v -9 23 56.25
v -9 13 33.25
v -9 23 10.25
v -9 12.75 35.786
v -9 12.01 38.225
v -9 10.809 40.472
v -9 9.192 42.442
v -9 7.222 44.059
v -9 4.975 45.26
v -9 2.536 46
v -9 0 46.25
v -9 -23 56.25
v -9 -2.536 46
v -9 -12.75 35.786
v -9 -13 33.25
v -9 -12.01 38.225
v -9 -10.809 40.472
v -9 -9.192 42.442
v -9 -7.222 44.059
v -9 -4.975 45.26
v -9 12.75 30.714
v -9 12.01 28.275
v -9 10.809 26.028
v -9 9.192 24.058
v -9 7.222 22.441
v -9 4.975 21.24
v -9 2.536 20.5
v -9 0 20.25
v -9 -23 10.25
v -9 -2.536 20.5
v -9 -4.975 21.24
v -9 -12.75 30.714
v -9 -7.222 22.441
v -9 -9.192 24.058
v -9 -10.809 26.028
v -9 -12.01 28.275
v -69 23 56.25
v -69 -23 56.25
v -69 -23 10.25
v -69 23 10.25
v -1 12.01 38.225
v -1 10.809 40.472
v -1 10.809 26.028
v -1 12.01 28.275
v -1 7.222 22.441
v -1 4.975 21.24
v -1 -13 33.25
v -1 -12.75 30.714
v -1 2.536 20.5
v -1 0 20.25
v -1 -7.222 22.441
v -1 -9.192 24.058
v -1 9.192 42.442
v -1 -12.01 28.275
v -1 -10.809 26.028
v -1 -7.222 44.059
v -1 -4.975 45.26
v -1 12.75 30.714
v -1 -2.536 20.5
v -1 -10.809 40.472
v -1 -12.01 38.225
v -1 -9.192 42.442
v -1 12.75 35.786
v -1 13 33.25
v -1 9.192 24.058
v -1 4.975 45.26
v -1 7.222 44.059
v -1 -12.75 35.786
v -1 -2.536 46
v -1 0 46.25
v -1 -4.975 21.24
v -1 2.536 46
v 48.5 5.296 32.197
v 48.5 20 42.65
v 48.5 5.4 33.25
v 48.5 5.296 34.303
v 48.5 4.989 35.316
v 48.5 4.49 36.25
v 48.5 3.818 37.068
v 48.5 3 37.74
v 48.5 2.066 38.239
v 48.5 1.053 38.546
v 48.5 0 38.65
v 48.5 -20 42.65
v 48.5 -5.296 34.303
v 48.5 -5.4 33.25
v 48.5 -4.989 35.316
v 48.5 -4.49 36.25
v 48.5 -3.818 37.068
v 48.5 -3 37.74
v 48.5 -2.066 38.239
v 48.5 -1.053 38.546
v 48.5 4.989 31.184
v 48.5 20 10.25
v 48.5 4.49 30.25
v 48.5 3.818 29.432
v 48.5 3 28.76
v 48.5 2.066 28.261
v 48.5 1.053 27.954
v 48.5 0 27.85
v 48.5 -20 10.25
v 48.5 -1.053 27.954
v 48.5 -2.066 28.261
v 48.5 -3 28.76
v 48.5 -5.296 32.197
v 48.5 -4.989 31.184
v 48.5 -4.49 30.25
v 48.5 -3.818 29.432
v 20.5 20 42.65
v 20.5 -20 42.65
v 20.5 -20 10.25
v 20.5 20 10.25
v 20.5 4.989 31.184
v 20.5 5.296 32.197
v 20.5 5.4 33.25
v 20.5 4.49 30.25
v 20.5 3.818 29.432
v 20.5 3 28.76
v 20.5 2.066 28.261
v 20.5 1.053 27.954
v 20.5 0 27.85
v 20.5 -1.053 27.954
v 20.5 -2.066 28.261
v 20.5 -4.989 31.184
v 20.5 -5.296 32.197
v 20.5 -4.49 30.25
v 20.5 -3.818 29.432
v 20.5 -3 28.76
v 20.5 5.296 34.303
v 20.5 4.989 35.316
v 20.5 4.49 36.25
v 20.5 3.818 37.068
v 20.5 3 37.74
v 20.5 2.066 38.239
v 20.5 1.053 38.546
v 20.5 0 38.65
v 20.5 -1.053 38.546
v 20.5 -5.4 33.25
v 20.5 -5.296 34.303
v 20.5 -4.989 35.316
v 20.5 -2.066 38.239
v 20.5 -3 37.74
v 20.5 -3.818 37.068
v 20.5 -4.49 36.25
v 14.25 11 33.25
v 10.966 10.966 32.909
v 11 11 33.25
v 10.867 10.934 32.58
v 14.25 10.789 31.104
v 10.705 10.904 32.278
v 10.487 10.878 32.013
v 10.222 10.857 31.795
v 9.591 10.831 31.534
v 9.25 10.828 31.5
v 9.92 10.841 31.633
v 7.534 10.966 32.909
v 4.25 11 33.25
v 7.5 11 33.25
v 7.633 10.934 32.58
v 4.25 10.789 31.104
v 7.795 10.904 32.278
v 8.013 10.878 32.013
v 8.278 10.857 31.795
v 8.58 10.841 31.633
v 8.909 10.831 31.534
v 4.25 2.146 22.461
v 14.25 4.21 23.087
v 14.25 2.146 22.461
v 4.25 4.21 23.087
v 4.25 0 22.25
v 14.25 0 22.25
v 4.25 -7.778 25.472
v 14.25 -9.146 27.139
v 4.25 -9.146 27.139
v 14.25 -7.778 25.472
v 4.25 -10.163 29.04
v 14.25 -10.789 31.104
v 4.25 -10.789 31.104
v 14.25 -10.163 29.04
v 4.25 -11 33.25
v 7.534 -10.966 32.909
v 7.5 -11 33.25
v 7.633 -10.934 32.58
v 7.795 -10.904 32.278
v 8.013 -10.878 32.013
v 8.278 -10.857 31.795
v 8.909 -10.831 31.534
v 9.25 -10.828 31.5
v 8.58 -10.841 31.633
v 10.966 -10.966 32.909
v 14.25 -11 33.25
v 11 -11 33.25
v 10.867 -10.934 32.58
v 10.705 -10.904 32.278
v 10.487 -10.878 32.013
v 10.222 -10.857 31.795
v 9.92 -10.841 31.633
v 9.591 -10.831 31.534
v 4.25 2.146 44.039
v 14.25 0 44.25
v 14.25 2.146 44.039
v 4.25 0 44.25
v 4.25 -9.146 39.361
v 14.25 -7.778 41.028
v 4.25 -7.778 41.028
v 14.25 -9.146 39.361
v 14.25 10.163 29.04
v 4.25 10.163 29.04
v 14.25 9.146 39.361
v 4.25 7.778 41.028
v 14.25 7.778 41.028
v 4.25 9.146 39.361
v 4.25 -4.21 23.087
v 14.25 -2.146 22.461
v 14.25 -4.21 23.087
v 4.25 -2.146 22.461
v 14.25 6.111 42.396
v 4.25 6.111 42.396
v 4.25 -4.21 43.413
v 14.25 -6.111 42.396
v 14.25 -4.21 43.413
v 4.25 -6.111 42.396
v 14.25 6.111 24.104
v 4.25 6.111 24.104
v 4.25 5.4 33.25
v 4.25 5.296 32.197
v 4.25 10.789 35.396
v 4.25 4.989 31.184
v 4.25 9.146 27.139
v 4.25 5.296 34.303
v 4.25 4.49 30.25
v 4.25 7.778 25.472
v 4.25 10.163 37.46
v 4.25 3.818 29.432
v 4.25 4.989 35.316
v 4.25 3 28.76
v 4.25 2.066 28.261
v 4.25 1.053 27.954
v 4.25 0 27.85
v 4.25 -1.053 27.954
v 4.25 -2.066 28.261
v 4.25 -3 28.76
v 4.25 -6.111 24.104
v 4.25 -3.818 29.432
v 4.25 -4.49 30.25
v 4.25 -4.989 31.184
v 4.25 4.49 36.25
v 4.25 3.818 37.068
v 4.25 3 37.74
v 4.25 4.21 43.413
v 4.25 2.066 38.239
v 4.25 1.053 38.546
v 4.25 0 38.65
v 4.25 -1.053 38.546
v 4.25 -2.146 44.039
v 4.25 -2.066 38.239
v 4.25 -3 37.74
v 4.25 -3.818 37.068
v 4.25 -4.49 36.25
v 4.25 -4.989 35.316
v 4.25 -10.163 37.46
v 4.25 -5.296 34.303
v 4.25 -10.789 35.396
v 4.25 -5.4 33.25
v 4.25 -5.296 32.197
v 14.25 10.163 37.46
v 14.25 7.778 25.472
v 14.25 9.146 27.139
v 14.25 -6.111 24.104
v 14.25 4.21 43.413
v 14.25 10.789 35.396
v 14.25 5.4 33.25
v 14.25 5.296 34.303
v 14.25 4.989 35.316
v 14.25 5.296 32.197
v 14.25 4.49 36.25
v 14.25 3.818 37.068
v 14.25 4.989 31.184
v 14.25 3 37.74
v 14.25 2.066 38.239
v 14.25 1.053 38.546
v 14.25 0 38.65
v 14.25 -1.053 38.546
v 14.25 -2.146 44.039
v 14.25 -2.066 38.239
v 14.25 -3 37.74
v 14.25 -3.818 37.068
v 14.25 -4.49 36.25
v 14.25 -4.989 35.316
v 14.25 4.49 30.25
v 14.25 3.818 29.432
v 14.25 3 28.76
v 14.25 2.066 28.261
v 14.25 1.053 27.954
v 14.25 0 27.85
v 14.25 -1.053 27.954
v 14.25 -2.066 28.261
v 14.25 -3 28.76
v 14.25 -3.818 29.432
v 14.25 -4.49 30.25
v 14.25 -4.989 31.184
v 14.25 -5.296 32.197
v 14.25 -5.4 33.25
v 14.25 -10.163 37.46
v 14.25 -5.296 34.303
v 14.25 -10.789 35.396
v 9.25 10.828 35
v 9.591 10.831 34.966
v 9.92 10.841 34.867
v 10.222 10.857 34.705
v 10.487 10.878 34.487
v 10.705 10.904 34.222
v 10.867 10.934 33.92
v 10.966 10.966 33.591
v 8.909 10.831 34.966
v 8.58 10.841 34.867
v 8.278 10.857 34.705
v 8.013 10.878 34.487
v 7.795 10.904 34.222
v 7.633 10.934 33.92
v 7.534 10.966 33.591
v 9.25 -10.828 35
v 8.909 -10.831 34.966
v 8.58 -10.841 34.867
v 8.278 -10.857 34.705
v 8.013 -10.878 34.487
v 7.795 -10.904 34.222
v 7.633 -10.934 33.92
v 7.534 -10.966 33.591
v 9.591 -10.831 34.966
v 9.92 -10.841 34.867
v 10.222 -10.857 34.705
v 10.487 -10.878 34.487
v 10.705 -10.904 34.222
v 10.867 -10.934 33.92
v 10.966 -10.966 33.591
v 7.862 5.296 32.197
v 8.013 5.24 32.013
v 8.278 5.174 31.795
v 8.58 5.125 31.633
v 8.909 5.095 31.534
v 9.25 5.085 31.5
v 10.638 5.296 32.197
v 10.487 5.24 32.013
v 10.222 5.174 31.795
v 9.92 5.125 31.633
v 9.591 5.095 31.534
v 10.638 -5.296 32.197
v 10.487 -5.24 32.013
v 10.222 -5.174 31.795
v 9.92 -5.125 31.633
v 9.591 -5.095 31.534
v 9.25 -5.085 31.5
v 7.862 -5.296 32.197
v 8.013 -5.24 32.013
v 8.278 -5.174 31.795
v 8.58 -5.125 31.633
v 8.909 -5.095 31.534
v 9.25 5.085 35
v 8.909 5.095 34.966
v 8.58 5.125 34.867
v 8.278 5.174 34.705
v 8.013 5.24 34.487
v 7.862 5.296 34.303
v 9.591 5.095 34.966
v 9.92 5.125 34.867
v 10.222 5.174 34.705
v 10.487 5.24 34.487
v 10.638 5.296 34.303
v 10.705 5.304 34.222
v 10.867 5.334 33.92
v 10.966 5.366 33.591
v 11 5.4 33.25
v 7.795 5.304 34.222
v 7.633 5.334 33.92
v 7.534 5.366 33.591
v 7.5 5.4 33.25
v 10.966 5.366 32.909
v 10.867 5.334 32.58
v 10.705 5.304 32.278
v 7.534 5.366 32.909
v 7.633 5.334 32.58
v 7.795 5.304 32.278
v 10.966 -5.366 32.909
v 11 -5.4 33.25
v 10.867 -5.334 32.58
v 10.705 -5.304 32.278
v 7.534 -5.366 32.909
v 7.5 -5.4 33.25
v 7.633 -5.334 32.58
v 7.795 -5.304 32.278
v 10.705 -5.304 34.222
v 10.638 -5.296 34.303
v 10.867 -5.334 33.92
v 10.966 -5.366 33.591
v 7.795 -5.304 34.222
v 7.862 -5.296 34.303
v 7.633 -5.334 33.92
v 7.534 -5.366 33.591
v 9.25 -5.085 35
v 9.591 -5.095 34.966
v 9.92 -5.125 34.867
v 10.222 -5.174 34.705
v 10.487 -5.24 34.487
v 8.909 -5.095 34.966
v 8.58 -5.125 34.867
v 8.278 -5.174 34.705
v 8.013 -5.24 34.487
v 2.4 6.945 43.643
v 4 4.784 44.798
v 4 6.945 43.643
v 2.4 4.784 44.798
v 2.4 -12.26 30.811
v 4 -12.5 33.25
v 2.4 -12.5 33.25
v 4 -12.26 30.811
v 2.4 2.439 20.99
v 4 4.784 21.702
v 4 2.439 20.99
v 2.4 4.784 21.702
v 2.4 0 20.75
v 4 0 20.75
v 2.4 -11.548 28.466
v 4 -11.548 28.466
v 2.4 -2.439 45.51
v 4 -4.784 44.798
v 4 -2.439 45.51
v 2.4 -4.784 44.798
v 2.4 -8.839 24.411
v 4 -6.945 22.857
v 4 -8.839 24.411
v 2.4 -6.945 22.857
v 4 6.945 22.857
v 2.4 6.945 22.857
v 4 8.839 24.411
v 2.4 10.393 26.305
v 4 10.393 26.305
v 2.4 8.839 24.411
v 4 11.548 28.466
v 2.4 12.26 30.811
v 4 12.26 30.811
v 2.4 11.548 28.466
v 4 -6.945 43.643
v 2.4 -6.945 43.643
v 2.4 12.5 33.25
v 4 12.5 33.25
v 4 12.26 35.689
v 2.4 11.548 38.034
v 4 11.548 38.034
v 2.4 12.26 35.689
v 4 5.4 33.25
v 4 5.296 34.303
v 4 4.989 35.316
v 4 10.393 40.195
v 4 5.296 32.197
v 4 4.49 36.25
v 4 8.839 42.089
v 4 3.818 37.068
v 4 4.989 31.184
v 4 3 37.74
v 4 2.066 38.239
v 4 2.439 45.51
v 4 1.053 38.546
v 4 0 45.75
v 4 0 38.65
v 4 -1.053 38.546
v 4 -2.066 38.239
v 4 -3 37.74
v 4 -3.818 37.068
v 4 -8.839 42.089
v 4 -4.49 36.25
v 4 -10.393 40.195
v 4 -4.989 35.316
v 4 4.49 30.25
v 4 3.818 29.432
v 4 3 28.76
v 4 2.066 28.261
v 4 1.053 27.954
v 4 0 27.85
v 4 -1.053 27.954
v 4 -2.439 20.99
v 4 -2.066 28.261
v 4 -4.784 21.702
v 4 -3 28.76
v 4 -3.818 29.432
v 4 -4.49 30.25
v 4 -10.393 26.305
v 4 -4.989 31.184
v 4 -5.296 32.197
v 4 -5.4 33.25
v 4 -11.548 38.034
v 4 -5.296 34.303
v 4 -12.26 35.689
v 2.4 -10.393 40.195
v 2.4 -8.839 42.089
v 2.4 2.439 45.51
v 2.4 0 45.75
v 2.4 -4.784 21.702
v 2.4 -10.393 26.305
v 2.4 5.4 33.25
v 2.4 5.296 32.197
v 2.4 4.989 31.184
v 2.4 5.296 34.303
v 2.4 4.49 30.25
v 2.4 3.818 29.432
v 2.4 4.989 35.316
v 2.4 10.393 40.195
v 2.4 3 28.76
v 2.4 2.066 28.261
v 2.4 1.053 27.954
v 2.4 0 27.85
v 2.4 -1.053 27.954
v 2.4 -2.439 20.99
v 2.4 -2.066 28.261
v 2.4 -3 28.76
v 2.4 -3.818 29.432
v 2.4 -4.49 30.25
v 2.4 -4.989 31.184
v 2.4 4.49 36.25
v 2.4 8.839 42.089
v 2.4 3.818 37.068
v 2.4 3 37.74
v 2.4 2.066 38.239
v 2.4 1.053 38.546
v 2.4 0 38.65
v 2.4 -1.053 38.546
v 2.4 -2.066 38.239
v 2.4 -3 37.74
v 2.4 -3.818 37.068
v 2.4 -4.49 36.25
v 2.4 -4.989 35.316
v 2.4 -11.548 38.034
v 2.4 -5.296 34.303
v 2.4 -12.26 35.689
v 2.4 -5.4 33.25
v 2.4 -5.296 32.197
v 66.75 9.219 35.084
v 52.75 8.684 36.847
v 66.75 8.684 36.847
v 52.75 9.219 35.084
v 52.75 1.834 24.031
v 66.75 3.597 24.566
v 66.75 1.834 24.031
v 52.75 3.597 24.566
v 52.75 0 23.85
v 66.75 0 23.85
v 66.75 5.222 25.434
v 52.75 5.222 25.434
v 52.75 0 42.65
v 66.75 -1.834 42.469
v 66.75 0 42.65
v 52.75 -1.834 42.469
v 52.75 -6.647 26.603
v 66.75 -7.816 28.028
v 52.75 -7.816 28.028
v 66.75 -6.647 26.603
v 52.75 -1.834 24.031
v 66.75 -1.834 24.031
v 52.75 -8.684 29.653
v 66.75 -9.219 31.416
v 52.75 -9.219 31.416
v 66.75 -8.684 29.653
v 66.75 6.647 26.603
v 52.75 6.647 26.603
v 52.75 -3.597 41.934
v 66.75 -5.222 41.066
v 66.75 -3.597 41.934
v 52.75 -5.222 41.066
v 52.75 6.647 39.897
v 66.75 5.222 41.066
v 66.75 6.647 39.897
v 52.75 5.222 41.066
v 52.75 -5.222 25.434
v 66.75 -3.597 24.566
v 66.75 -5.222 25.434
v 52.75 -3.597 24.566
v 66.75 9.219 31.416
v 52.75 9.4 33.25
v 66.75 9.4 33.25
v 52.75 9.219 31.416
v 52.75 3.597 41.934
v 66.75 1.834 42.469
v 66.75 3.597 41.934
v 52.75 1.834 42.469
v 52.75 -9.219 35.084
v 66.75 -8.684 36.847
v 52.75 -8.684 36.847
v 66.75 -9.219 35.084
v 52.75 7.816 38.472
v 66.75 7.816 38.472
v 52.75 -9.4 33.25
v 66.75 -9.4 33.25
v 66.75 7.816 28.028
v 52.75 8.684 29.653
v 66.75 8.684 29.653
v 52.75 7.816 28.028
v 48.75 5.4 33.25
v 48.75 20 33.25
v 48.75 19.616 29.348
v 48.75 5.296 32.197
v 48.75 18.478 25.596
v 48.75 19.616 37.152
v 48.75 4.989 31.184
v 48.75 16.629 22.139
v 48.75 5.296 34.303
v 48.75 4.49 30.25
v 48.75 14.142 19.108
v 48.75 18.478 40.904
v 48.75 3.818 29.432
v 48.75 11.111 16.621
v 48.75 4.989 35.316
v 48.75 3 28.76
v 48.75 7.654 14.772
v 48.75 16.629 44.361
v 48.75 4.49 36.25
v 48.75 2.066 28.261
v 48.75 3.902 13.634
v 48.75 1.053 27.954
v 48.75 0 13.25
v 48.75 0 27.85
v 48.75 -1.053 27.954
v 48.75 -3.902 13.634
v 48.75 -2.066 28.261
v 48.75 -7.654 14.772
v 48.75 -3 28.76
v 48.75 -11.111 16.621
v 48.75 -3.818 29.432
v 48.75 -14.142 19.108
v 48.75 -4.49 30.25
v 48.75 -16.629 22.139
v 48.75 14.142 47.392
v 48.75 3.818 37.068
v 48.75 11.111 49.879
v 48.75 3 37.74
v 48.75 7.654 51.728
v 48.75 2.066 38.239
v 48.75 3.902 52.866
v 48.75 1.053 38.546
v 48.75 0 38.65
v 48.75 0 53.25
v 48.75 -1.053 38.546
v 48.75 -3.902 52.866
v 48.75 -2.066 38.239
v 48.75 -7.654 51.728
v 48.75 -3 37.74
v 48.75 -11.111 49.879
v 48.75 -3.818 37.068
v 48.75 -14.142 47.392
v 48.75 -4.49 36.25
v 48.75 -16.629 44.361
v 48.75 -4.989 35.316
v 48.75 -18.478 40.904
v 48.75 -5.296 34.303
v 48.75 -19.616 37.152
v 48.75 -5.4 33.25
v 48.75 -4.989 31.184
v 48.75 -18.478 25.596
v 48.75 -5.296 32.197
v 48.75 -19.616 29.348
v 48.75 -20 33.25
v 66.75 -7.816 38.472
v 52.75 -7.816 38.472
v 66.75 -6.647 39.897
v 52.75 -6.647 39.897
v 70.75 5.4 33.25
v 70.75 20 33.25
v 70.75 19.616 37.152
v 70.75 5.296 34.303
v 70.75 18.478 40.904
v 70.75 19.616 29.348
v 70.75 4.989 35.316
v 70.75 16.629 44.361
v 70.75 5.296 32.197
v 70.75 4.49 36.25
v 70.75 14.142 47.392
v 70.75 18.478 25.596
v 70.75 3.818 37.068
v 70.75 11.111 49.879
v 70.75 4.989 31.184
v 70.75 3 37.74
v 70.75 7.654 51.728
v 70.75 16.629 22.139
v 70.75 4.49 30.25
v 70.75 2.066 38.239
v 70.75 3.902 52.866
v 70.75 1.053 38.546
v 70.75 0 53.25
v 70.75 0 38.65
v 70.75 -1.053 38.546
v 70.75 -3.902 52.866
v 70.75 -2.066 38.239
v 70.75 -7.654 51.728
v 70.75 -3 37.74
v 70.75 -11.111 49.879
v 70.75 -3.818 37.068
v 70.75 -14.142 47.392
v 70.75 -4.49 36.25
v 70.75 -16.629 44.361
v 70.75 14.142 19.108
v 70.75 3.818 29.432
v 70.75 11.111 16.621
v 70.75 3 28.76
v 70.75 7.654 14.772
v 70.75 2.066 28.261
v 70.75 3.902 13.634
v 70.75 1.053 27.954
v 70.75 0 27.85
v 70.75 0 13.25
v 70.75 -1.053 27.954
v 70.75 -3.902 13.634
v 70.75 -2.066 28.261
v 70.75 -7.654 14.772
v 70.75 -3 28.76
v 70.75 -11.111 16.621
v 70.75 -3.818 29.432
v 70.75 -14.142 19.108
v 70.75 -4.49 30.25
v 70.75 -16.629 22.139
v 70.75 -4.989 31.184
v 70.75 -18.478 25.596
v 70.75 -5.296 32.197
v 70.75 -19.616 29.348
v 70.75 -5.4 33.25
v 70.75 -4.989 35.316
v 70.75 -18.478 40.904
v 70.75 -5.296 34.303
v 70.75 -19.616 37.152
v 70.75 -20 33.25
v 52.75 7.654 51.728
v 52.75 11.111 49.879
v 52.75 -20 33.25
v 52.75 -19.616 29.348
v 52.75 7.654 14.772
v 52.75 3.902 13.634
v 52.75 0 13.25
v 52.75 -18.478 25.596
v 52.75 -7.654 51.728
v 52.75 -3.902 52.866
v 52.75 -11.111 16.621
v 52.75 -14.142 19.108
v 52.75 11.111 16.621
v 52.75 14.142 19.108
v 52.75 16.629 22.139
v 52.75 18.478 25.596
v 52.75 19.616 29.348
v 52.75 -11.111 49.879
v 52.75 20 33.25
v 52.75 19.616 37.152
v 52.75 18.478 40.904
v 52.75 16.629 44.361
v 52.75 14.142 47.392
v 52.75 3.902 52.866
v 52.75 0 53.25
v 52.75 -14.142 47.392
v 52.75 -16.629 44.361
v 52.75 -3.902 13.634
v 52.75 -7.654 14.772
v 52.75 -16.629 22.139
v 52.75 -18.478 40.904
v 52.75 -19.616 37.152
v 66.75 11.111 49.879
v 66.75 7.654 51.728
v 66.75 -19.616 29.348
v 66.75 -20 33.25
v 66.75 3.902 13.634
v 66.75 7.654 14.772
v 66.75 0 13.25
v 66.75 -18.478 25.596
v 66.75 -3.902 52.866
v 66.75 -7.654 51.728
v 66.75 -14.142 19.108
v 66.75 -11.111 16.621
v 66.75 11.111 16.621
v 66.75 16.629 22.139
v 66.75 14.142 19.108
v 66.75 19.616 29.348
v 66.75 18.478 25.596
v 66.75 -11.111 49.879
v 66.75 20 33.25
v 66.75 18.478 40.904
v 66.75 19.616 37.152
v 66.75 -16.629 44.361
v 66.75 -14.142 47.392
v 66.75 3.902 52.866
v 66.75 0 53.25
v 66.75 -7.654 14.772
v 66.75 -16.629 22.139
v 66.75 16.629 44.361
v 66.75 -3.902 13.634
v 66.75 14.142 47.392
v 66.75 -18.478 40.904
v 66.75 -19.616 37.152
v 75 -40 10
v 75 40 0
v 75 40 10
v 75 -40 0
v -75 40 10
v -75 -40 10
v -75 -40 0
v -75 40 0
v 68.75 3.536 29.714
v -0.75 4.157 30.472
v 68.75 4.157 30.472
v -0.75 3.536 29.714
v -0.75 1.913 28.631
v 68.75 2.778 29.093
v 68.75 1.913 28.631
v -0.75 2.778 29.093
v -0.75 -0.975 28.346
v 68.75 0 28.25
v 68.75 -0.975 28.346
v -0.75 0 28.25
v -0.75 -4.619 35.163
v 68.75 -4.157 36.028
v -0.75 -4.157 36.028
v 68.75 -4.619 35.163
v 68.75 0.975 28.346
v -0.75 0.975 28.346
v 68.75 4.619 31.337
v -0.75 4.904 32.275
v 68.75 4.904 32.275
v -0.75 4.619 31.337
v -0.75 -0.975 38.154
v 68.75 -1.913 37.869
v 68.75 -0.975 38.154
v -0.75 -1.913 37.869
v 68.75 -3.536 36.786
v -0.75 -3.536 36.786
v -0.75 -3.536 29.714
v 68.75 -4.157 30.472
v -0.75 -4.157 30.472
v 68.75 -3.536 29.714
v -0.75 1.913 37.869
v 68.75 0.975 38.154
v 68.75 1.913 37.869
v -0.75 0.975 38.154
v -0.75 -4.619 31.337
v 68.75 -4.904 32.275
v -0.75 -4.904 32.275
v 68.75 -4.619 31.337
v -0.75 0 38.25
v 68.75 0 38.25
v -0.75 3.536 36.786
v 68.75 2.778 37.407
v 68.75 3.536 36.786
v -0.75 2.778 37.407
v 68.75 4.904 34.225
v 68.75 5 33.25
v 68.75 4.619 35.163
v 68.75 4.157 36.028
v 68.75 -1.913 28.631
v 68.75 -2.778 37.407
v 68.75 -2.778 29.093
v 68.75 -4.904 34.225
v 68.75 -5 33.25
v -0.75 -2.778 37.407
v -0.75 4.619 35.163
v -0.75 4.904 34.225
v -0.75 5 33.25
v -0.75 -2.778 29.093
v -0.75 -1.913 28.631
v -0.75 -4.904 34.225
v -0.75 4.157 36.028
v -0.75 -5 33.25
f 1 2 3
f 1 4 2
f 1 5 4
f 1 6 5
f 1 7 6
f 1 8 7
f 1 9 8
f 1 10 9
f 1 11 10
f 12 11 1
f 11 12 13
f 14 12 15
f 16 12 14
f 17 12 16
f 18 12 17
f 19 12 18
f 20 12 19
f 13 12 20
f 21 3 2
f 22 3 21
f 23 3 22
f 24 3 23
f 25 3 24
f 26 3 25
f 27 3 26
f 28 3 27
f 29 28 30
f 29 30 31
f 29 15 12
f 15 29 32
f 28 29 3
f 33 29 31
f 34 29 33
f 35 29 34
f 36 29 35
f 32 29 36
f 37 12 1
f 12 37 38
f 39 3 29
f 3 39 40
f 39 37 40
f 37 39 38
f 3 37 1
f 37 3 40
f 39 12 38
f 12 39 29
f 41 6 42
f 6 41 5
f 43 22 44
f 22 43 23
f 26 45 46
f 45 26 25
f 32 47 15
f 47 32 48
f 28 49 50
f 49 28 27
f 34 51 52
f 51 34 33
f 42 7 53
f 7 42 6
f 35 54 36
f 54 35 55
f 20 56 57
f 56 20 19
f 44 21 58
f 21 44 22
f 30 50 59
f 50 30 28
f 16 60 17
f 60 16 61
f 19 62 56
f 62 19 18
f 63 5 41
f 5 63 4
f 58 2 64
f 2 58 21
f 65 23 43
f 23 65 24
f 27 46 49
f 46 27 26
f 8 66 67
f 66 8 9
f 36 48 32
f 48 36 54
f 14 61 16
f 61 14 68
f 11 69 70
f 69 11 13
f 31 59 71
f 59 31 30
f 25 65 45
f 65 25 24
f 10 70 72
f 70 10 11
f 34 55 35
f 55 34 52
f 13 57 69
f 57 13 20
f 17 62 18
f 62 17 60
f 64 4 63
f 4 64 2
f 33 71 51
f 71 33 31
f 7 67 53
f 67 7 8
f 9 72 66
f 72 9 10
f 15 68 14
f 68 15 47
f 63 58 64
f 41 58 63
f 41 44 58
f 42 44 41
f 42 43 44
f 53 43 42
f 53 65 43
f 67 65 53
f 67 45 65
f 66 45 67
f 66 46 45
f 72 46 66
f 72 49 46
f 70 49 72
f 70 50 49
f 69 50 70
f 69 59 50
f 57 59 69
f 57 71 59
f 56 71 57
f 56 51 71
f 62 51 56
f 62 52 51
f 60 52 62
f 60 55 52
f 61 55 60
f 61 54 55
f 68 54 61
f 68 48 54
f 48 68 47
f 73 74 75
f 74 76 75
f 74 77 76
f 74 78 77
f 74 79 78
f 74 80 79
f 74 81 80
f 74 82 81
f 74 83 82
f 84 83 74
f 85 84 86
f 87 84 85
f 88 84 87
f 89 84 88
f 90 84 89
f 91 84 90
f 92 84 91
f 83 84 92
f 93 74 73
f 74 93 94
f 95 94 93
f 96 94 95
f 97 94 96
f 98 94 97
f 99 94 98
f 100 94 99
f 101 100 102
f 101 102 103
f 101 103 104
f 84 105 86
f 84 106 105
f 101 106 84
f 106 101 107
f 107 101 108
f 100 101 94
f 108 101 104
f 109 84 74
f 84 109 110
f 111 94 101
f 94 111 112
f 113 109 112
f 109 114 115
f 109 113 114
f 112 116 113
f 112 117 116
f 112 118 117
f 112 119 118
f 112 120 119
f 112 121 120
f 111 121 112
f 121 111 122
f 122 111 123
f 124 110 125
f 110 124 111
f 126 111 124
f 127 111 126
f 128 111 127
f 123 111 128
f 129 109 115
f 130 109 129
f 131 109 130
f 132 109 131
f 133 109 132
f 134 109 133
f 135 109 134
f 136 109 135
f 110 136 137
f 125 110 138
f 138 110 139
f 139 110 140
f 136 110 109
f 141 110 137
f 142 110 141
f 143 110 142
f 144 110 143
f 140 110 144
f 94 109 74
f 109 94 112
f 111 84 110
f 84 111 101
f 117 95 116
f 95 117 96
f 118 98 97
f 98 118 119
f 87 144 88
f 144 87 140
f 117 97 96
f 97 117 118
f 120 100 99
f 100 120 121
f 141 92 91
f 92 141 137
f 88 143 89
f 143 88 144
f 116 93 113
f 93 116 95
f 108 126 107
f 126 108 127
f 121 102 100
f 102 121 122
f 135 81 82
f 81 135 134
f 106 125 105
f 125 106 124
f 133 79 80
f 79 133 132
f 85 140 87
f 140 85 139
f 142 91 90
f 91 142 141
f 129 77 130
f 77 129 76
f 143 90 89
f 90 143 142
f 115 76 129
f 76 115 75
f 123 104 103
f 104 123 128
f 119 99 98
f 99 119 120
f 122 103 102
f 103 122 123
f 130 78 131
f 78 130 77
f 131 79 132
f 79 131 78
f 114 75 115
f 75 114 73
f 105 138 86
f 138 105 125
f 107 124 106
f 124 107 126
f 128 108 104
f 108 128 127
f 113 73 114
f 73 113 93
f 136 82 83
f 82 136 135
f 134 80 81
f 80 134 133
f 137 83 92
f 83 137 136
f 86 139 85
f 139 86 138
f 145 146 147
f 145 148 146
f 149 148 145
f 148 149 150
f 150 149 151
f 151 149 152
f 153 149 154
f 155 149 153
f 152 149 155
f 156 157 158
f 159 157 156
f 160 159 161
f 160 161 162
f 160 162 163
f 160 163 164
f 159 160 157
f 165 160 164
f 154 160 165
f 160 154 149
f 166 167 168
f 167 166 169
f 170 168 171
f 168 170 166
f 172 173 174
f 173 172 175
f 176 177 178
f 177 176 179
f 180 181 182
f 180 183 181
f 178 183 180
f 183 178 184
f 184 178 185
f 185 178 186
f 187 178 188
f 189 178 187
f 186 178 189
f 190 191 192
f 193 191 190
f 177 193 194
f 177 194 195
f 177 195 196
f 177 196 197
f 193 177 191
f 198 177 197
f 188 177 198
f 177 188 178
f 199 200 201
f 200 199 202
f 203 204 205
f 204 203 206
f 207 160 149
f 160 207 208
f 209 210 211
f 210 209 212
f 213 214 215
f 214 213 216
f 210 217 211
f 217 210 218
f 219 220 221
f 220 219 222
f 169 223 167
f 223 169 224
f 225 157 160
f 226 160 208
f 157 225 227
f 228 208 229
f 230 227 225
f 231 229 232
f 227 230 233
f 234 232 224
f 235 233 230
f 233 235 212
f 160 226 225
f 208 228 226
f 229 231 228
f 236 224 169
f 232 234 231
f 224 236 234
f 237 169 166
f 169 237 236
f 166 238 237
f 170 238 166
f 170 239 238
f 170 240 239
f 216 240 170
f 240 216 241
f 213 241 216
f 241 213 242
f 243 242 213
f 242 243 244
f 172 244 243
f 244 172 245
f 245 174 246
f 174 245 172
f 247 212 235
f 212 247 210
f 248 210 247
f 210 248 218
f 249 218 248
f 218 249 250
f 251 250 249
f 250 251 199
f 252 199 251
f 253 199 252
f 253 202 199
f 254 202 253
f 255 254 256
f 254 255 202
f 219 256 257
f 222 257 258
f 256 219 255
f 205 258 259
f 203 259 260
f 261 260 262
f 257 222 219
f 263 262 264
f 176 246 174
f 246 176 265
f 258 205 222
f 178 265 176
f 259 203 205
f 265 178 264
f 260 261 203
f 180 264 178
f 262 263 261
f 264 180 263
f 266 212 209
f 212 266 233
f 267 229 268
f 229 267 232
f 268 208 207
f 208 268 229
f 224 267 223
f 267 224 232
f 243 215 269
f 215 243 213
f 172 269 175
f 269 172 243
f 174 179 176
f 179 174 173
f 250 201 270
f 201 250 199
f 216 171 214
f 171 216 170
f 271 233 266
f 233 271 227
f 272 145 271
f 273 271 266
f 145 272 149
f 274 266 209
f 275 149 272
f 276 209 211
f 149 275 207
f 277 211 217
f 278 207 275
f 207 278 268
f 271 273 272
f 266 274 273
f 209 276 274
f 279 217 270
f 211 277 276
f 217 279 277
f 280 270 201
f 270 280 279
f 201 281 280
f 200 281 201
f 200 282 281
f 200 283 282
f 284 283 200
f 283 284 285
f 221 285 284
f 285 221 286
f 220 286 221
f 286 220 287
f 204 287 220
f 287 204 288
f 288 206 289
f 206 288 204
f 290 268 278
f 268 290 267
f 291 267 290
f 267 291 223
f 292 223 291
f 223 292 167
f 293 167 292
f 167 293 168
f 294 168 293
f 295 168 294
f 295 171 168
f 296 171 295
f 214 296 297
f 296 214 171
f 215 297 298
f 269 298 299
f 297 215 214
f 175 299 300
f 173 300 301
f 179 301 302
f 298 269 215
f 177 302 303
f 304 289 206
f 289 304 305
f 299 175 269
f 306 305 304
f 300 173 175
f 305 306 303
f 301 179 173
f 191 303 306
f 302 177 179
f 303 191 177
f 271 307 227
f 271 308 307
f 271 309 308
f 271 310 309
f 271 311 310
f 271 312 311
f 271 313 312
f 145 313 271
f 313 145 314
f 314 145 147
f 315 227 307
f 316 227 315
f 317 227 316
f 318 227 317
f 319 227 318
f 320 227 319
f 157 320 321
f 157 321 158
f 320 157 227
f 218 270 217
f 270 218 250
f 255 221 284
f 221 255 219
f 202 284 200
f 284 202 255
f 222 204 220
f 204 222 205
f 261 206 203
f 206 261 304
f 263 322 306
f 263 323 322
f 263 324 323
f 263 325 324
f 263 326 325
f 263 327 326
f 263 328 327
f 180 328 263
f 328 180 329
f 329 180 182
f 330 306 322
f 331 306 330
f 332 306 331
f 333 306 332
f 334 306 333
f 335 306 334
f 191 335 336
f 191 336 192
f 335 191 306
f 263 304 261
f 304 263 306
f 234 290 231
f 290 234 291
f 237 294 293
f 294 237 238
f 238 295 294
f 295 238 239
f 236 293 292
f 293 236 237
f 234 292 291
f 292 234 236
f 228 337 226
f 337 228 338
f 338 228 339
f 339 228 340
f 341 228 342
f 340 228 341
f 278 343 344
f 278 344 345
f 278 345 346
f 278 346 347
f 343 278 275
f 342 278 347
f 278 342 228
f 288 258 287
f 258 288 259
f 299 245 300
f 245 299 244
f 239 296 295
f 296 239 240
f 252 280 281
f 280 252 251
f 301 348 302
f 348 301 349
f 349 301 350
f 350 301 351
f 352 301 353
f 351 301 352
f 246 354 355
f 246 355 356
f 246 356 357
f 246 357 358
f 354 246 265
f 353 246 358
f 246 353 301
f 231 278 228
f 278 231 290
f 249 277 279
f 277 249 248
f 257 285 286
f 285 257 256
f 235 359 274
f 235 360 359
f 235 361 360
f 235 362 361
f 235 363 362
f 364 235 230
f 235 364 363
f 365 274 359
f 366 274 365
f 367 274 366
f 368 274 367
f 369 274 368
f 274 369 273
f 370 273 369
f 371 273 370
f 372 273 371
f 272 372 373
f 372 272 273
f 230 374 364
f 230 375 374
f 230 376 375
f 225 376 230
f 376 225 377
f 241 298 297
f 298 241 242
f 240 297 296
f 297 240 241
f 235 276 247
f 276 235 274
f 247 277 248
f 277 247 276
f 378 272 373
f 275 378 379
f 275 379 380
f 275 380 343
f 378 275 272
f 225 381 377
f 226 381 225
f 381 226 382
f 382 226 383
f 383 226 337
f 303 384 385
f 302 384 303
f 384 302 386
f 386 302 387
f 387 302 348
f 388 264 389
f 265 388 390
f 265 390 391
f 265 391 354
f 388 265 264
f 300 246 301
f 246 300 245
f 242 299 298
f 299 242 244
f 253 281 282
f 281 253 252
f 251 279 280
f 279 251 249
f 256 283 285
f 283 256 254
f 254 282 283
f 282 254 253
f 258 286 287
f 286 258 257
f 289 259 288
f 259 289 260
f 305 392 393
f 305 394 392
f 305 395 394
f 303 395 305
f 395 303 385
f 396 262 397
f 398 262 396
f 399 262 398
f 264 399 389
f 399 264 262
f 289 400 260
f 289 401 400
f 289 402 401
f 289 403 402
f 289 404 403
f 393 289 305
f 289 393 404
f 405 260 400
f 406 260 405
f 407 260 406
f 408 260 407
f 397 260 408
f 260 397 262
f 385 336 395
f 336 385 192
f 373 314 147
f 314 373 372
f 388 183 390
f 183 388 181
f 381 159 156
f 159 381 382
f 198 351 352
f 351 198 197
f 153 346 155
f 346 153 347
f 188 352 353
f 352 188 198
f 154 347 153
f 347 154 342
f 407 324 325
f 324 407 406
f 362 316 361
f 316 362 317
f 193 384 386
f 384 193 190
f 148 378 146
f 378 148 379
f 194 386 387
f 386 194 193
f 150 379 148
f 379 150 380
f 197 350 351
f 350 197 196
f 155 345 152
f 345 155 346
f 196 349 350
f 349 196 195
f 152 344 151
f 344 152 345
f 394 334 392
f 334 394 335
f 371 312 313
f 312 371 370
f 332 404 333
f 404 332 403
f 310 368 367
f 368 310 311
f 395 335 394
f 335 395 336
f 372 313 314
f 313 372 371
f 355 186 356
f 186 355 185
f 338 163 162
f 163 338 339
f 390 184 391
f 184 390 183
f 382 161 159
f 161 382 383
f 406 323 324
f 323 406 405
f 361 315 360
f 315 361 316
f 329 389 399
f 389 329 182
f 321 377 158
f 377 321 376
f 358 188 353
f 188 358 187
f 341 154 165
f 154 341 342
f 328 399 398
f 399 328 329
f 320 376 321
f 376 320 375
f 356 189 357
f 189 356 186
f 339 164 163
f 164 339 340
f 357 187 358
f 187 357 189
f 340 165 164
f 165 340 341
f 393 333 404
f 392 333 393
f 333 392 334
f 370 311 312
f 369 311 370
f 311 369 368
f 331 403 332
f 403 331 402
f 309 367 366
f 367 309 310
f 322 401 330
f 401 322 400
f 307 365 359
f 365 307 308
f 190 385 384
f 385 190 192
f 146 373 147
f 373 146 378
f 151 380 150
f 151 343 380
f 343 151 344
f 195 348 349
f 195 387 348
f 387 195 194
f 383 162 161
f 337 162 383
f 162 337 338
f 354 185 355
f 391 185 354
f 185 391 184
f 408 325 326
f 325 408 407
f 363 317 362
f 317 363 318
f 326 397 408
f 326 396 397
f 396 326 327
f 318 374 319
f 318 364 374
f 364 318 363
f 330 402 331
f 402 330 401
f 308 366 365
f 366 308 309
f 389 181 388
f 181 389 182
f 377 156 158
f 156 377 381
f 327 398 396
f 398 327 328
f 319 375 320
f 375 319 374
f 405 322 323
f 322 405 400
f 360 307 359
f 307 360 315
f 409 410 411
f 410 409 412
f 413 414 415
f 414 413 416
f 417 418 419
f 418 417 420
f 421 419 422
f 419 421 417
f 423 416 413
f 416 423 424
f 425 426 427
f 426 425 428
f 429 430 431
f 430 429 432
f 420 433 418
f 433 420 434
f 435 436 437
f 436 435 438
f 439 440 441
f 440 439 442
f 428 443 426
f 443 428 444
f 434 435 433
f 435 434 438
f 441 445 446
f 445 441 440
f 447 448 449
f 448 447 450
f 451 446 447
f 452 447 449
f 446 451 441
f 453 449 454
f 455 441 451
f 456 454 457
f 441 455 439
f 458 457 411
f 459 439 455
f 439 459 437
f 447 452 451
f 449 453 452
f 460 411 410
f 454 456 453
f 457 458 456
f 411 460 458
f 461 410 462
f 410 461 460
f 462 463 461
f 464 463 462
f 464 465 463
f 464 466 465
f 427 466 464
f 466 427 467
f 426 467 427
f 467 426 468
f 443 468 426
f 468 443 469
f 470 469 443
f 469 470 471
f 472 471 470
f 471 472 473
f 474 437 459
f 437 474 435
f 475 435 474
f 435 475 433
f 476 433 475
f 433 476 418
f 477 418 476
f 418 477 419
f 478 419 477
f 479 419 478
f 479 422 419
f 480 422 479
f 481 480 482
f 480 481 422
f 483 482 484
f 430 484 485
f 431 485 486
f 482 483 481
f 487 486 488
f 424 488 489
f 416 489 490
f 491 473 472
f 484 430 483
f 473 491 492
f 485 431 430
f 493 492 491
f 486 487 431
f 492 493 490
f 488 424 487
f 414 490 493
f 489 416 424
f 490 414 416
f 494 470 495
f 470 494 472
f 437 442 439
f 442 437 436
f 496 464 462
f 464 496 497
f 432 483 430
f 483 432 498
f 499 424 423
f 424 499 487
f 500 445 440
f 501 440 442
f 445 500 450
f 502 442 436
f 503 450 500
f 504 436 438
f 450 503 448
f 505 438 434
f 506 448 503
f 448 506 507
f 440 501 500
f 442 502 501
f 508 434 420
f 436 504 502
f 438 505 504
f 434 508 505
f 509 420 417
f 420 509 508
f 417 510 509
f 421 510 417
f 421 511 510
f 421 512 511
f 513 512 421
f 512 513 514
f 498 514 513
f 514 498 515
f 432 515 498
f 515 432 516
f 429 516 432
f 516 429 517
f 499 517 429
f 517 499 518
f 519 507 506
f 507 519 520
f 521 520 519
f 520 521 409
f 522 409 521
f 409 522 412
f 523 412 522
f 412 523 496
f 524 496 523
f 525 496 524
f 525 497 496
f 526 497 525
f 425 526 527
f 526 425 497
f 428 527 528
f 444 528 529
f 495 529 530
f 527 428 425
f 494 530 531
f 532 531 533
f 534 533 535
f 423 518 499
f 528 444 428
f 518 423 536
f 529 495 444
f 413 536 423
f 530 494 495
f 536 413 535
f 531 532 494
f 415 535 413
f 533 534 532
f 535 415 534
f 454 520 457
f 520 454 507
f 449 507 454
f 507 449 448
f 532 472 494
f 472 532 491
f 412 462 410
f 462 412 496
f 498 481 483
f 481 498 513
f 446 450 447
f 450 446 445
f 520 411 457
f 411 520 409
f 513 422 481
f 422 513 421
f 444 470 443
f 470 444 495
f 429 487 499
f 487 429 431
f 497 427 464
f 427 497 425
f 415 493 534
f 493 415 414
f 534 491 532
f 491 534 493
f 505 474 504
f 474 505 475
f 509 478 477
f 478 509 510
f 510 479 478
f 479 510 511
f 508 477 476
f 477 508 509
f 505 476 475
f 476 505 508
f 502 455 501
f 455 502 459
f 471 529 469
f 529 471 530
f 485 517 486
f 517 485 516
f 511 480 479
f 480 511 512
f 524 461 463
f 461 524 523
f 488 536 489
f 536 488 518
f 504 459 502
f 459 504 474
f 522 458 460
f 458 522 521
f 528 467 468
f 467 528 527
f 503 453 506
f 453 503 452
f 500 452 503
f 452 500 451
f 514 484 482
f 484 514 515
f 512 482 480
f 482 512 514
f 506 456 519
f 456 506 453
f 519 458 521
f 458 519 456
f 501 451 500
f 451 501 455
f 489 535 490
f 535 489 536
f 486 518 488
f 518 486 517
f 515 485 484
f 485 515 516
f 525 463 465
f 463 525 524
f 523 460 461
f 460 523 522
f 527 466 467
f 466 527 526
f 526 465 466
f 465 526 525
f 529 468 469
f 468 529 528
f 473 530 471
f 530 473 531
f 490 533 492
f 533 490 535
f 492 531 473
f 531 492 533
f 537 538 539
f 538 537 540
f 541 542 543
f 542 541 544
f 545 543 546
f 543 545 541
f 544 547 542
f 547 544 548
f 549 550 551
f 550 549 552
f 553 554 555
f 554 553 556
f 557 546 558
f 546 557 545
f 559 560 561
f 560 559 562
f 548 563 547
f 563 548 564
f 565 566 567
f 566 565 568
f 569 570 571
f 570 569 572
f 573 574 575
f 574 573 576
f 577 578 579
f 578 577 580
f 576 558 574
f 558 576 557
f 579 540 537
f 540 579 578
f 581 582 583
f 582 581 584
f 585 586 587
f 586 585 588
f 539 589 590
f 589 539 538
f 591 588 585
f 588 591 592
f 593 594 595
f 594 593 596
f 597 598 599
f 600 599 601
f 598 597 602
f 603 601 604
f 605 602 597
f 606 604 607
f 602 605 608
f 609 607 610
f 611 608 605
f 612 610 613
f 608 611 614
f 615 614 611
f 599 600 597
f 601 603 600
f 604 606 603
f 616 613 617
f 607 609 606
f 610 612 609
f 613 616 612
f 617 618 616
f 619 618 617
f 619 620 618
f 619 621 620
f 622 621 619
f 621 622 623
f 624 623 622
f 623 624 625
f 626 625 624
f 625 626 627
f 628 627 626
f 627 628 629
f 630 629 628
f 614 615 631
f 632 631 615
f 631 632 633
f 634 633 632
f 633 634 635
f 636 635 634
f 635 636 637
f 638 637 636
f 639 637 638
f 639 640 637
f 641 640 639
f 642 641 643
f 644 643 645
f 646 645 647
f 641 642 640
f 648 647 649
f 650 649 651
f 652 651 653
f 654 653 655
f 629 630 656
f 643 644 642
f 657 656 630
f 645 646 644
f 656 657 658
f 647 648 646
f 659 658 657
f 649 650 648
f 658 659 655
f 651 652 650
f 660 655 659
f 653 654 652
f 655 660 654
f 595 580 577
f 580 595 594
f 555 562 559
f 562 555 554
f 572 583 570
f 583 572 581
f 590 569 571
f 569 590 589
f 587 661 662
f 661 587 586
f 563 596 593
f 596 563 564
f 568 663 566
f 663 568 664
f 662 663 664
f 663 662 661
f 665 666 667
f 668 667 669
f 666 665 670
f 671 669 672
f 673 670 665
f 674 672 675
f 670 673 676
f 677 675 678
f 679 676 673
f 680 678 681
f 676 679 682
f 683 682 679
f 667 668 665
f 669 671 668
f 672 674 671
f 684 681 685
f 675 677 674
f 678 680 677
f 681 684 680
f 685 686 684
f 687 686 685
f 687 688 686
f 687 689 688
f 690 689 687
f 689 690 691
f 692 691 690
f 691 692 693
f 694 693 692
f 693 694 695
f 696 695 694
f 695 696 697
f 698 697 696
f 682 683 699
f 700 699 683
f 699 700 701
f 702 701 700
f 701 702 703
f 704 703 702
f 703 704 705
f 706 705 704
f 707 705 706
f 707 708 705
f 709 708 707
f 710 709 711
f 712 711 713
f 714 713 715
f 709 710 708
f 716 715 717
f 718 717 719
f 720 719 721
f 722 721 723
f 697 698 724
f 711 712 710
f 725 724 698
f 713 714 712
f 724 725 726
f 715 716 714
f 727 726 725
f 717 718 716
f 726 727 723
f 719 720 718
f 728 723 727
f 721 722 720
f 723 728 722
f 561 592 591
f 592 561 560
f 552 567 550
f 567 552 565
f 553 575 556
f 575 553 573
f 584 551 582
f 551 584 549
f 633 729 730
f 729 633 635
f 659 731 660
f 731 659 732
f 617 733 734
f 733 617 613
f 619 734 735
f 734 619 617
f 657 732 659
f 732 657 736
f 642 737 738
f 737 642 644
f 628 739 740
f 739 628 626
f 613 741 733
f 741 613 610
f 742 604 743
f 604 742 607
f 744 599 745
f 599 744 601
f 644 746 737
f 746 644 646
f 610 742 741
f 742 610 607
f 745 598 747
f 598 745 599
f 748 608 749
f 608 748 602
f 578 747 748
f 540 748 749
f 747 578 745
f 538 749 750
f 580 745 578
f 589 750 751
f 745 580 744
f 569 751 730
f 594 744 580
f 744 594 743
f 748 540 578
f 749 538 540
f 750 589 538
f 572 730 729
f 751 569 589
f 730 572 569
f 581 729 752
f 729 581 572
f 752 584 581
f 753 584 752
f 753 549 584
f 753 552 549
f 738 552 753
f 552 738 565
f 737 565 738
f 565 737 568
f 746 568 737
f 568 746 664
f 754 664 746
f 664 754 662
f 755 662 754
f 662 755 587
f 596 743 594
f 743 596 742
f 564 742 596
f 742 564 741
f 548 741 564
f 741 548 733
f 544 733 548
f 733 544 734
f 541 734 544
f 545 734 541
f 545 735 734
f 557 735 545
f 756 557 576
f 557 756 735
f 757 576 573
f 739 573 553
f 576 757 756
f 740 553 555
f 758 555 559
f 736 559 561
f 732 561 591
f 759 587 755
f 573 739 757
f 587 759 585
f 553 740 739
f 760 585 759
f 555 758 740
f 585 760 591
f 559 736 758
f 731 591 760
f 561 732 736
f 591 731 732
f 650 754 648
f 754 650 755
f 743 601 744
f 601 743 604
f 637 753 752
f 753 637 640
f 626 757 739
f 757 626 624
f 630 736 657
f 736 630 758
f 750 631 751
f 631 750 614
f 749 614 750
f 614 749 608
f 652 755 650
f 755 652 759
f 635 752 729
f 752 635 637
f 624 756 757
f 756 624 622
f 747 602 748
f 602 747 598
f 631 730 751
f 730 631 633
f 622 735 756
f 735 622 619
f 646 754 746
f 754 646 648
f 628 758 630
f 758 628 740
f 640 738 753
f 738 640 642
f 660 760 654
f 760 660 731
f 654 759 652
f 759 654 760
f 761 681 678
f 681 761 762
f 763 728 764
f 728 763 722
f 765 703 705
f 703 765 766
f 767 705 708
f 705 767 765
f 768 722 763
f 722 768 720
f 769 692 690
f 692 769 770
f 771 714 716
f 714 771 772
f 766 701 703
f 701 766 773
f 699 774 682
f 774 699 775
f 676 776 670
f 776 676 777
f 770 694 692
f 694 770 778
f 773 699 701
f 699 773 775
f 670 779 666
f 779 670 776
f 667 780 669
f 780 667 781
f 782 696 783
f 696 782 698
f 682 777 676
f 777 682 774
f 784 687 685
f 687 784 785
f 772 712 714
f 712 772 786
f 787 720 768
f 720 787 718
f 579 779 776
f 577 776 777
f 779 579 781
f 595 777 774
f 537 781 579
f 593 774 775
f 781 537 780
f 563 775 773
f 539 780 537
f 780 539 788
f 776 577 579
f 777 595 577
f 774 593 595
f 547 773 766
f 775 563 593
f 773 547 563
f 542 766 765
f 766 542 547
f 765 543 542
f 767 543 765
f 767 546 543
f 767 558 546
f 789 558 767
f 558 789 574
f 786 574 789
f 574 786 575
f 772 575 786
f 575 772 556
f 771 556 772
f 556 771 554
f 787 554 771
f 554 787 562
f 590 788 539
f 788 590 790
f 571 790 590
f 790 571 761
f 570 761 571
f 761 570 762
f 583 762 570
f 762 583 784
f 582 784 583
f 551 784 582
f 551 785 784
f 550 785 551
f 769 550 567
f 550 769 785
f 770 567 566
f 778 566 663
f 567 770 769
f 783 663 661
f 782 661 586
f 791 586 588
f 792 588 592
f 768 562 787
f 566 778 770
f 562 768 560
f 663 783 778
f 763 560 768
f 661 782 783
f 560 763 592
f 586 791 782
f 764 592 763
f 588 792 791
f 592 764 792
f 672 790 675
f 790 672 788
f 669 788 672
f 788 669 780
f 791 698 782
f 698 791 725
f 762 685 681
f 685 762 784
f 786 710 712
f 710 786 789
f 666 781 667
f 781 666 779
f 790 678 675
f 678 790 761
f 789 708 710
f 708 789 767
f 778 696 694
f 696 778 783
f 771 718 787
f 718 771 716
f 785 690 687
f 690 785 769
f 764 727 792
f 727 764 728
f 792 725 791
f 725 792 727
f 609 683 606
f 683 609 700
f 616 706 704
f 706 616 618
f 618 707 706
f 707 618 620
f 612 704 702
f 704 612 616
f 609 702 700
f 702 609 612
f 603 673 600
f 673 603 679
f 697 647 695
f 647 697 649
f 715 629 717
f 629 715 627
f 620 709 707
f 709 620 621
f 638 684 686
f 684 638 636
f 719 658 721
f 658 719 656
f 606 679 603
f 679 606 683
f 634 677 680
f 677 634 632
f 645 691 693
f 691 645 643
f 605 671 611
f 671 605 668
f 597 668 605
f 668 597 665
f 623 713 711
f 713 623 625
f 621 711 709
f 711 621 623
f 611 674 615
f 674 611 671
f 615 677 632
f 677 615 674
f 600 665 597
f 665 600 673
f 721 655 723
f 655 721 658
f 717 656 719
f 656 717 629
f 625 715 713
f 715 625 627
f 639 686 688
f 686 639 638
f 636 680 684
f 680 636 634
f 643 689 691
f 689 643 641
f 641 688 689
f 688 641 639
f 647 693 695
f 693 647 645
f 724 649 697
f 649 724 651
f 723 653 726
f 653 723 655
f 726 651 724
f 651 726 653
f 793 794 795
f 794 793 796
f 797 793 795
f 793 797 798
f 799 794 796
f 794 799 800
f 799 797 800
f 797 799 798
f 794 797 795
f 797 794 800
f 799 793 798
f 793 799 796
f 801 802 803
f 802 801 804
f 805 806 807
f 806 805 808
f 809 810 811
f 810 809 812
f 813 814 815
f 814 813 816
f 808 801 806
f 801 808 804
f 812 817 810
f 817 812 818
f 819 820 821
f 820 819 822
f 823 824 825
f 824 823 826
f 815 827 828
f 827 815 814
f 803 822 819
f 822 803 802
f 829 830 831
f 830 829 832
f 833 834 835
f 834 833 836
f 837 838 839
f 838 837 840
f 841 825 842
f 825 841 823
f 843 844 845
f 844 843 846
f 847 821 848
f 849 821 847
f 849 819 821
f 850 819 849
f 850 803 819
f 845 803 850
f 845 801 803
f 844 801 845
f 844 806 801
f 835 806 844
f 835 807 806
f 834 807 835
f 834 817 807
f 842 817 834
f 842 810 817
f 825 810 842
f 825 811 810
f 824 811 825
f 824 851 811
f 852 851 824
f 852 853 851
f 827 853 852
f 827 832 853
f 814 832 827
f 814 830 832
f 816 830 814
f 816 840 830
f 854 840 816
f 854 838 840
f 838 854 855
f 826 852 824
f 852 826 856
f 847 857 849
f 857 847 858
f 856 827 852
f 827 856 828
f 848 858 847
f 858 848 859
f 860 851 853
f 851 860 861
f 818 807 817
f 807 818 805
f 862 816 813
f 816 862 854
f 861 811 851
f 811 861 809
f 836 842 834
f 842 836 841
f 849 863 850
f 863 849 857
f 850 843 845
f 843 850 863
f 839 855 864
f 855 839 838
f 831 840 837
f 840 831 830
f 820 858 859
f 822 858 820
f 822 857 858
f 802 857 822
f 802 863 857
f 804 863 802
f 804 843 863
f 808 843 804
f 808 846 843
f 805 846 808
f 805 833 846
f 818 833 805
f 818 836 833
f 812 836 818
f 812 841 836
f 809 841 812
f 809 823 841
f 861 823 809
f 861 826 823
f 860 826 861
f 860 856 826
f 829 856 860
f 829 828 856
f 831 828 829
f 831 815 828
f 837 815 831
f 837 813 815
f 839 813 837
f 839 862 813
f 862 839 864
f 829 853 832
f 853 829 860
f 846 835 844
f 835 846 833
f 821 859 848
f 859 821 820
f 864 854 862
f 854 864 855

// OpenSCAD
$fn = 32;

// ------------------------------------------------------------------------
// Motor drive station: motor 60 x 46 mm, shaft d10, pulley d40
// Every part is its own module, assembly() places every instance.
// ------------------------------------------------------------------------

// --- part 1 ---
module station_bed() {
  difference() {
    translate([-75, -40, 0]) cube([150, 80, 10]);
  }
}

// --- part 2 ---
module drive_motor() {
  union() {
    translate([-30, -23, 0]) cube([60, 46, 46]);
    translate([34, 0, 23]) rotate([0, 90, 0]) cylinder(h = 8, d = 26, center = true);
  }
}

// --- part 3 ---
module pillow_block() {
  difference() {
    translate([-14, -20, 0]) cube([28, 40, 32.4]);
    translate([0, 0, 23]) rotate([0, 90, 0]) cylinder(h = 30, d = 10.8, center = true);
  }
}

// --- part 4 ---
module drive_shaft() {
  translate([0, 0, -34.75]) cylinder(h = 69.5, d = 10);
}

// --- part 5 ---
module shaft_collar() {
  difference() {
    cylinder(h = 10, d = 22);
    translate([0, 0, -1]) cylinder(h = 12, d = 10.8);
    translate([0, 0, 5]) rotate([90, 0, 0]) cylinder(h = 24, d = 3.5, center = true);
  }
}

// --- part 6 ---
module collar_washer() {
  difference() {
      translate([0, 0, 0]) cylinder(h = 1.6, d = 25);
      translate([0, 0, -1]) cylinder(h = 3.6, d = 10.8);
    }
}

// --- part 7 ---
module drive_pulley() {
  difference() {
    union() {
      cylinder(h = 22, d = 18.8);
      cylinder(h = 4, d = 40);
      translate([0, 0, 18]) cylinder(h = 4, d = 40);
    }
    translate([0, 0, -1]) cylinder(h = 24, d = 10.8);
  }
}

// --- assembly ---
module assembly() {
  color([0.80, 0.24, 0.20]) translate([0, 0, 0]) rotate([0, 0, 0]) station_bed();
  color([0.20, 0.45, 0.75]) translate([-39, 0, 10.25]) rotate([0, 0, 0]) drive_motor();
  color([0.25, 0.62, 0.32]) translate([34.5, 0, 10.25]) rotate([0, 0, 0]) pillow_block();
  color([0.92, 0.70, 0.18]) translate([34, 0, 33.25]) rotate([0, 90, 0]) drive_shaft();
  color([0.58, 0.35, 0.70]) translate([4.25, 0, 33.25]) rotate([0, 90, 0]) shaft_collar();
  color([0.16, 0.66, 0.66]) translate([2.4, 0, 33.25]) rotate([0, 90, 0]) collar_washer();
  color([0.85, 0.48, 0.18]) translate([48.75, 0, 33.25]) rotate([0, 90, 0]) drive_pulley();
}

assembly();
